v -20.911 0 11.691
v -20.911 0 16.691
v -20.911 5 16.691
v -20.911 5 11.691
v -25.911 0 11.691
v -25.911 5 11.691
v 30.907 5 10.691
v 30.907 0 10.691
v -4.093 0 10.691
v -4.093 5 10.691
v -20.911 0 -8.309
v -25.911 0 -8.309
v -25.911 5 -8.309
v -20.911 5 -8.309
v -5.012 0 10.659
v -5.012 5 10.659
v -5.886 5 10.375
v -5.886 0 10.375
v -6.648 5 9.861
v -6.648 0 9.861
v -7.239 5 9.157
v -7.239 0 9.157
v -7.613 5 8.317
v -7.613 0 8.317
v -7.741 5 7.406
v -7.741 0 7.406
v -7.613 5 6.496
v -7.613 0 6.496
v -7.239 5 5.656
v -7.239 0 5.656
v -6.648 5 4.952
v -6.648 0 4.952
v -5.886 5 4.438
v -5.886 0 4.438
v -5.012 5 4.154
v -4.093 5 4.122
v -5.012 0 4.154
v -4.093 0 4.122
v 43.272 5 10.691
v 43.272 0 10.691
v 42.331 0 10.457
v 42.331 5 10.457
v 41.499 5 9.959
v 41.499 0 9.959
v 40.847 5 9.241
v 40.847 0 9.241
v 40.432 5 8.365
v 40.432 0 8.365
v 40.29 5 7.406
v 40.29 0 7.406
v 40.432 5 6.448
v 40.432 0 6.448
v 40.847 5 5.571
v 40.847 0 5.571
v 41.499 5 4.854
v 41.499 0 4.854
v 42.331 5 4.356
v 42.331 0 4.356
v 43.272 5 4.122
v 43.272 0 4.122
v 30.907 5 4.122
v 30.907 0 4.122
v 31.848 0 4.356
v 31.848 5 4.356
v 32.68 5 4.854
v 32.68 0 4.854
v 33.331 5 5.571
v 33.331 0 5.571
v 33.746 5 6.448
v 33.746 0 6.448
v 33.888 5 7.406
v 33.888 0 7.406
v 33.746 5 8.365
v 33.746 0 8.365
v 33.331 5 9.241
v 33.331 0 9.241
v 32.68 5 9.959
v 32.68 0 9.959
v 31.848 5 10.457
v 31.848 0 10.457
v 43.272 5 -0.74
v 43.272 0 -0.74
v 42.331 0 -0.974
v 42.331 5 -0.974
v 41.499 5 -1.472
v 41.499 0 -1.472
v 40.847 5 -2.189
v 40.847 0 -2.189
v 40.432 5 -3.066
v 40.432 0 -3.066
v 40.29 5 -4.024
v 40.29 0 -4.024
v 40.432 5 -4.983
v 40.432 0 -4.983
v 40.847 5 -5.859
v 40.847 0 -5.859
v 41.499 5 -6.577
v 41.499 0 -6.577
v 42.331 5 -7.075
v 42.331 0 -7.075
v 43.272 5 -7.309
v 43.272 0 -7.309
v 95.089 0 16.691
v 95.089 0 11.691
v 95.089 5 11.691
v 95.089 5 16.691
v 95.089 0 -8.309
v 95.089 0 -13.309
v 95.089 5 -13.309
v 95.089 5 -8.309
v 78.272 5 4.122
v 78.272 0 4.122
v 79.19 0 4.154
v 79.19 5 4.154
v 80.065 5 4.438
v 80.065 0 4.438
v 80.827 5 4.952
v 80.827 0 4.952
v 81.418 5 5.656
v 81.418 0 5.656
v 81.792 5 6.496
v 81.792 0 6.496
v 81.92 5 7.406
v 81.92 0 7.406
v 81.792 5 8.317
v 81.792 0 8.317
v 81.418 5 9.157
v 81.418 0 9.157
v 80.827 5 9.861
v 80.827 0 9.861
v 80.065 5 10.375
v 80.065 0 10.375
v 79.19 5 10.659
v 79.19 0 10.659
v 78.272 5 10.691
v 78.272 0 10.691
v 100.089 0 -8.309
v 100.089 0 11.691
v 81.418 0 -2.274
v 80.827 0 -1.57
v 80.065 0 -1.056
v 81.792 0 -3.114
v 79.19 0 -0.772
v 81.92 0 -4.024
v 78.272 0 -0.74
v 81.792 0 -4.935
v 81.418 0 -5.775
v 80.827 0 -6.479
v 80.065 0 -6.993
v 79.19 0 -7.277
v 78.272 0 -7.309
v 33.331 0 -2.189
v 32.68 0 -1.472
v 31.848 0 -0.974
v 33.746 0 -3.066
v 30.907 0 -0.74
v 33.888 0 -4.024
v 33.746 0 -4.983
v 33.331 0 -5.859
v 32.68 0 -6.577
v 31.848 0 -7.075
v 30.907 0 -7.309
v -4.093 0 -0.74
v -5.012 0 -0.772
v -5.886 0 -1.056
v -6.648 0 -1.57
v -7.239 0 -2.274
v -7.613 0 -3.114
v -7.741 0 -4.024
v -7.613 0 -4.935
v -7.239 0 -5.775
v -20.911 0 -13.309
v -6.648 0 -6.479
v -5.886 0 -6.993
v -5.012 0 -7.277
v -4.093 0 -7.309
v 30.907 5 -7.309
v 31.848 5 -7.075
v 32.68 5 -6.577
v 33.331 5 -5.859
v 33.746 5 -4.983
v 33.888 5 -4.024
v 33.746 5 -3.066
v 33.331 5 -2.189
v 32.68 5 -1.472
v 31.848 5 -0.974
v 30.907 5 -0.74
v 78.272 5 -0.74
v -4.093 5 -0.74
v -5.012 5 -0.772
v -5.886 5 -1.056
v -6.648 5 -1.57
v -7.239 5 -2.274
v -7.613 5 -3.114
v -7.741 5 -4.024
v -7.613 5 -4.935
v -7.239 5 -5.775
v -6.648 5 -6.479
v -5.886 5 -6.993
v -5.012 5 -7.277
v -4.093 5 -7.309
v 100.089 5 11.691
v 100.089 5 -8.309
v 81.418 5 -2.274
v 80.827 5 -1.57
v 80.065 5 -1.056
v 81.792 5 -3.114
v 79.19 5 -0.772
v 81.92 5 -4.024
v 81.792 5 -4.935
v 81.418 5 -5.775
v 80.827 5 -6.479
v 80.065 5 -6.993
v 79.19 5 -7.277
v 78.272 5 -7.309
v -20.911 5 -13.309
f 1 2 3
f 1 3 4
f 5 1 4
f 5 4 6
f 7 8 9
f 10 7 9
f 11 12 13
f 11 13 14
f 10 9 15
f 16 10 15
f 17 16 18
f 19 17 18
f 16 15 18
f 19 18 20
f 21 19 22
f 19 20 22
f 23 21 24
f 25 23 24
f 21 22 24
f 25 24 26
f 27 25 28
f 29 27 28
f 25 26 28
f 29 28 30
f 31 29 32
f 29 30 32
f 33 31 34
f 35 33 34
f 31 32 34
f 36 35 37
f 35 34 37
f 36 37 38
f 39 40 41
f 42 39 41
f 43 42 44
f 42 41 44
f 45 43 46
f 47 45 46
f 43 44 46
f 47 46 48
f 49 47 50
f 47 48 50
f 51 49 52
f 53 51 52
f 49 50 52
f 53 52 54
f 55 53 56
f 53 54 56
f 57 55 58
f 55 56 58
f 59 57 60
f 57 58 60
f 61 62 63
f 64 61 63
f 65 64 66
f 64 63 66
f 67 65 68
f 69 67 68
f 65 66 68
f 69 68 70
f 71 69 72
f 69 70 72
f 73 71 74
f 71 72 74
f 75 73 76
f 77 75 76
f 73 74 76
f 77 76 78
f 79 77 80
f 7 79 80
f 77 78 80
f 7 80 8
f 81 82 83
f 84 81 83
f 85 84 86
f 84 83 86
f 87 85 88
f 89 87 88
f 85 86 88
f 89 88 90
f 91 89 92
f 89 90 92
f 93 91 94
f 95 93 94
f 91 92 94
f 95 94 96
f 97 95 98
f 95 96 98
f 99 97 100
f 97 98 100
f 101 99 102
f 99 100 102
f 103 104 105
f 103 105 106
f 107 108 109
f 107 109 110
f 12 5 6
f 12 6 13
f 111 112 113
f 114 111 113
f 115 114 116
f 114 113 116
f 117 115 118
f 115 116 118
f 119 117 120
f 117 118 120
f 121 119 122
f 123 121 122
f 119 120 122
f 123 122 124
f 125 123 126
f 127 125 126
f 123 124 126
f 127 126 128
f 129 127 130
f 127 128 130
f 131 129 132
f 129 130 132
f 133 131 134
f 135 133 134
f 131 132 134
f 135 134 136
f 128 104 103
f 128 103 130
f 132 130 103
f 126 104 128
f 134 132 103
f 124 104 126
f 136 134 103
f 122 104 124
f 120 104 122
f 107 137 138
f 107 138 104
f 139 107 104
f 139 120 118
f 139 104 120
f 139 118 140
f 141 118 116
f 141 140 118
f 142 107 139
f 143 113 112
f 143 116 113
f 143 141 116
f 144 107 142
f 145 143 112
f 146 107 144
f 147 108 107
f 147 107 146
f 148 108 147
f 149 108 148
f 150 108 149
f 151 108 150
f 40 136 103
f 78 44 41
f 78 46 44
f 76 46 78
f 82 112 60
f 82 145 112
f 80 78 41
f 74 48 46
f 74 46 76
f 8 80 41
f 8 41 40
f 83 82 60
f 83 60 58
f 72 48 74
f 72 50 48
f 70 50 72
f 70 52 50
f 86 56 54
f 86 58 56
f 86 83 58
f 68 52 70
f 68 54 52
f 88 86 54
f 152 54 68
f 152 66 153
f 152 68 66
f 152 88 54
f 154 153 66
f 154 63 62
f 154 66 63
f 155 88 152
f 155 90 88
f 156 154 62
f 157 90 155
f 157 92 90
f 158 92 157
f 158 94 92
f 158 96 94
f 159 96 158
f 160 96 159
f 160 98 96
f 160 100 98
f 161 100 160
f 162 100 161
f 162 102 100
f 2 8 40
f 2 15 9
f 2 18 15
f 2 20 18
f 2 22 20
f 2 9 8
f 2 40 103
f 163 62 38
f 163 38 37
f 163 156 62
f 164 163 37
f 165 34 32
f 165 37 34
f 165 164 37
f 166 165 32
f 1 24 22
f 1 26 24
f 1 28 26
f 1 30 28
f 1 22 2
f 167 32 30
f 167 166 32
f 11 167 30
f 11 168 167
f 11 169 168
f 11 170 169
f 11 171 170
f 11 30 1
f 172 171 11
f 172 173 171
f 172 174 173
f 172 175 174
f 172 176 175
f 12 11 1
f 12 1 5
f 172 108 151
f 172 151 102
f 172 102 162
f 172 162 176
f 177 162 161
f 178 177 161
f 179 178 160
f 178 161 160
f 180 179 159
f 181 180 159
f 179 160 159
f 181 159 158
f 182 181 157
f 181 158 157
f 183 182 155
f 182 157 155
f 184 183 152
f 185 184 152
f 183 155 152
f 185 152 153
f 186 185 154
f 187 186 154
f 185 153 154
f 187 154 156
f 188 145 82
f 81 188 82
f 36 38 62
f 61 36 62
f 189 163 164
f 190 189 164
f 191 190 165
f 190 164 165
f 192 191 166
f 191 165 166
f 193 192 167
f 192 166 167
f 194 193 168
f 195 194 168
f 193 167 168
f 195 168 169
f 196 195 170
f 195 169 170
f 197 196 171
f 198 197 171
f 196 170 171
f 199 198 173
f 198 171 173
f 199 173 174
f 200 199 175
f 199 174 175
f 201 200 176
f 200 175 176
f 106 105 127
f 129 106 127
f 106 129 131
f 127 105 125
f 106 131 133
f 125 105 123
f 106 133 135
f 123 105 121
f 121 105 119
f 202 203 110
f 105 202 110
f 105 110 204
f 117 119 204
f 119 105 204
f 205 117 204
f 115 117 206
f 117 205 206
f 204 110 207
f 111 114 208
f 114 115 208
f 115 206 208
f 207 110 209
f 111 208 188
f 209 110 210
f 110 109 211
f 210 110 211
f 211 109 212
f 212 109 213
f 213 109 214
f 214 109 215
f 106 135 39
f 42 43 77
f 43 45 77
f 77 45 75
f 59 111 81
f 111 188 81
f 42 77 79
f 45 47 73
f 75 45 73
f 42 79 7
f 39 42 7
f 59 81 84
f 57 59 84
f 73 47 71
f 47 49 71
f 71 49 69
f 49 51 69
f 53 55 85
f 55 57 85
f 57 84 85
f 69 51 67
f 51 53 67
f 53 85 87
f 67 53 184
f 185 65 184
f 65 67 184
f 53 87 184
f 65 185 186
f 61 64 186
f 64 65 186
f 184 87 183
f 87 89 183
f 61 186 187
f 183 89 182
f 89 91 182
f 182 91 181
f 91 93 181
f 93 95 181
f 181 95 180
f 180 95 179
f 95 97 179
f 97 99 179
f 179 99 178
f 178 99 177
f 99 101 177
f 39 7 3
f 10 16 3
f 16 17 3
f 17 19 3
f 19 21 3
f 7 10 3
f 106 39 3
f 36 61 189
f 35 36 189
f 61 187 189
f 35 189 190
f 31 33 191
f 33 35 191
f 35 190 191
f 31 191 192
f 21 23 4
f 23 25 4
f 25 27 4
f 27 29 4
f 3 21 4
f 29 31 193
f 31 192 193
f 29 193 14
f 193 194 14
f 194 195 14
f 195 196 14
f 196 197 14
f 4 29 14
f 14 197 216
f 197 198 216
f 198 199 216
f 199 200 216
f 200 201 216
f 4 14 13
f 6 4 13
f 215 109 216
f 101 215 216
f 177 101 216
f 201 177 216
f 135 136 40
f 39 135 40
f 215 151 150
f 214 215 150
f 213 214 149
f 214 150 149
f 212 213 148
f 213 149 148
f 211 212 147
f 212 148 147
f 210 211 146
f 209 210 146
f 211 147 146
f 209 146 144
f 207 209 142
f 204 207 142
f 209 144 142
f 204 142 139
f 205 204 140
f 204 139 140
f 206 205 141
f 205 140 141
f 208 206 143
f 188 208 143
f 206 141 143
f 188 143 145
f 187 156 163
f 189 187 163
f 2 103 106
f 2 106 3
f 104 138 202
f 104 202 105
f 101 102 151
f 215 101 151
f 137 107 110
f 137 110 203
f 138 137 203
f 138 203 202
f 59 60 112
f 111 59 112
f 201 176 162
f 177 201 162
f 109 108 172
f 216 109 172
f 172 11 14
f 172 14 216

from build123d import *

# Parameters (mm, degrees)
BOSS_EXTRUDE1_DEPTH = 5


with BuildPart() as part:
    # Sketch2 → Boss-Extrude1 (new body)
    with BuildSketch(Plane(origin=(0, 0, 0), x_dir=(1, 0, 0), z_dir=(0, 1, 0))):
        Polygon((46.589298205, 13.308977097), (51.589298205, 13.308977097), (95.089298205, 13.308977097), (95.089298205, 8.308977097), (100.089298205, 8.308977097), (100.089298205, -11.691022903), (95.089298205, -11.691022903), (95.089298205, -16.691022903), (-20.910701795, -16.691022903), (-20.910701795, -11.691022903), (-25.910701795, -11.691022903), (-25.910701795, 8.308977097), (-20.910701795, 8.308977097), (-20.910701795, 13.308977097), (22.589298205, 13.308977097), (27.589298205, 13.308977097), align=None)
        with BuildLine():
            Line((78.271526231, -10.691022903), (43.271526231, -10.691022903))
            ThreePointArc((43.271526231, -10.691022903), (40.290117596, -7.406437763), (43.271526231, -4.121852623))
            Line((43.271526231, -4.121852623), (78.271526231, -4.121852623))
            ThreePointArc((78.271526231, -4.121852623), (81.920004192, -7.406437763), (78.271526231, -10.691022903))
        make_face(mode=Mode.SUBTRACT)
        with BuildLine():
            Line((-4.092929821, -4.121852623), (30.907070179, -4.121852623))
            ThreePointArc((30.907070179, -4.121852623), (33.888478814, -7.406437763), (30.907070179, -10.691022903))
            Line((30.907070179, -10.691022903), (-4.092929821, -10.691022903))
            ThreePointArc((-4.092929821, -10.691022903), (-7.741407782, -7.406437763), (-4.092929821, -4.121852623))
        make_face(mode=Mode.SUBTRACT)
        with BuildLine():
            Line((-4.092929821, 7.308977097), (30.907070179, 7.308977097))
            ThreePointArc((30.907070179, 7.308977097), (33.888478814, 4.024391957), (30.907070179, 0.739806817))
            Line((30.907070179, 0.739806817), (-4.092929821, 0.739806817))
            ThreePointArc((-4.092929821, 0.739806817), (-7.741407782, 4.024391957), (-4.092929821, 7.308977097))
        make_face(mode=Mode.SUBTRACT)
        with BuildLine():
            Line((78.271526231, 0.739806817), (43.271526231, 0.739806817))
            ThreePointArc((43.271526231, 0.739806817), (40.290117596, 4.024391957), (43.271526231, 7.308977097))
            Line((43.271526231, 7.308977097), (78.271526231, 7.308977097))
            ThreePointArc((78.271526231, 7.308977097), (81.920004192, 4.024391957), (78.271526231, 0.739806817))
        make_face(mode=Mode.SUBTRACT)
    extrude(amount=BOSS_EXTRUDE1_DEPTH)


solid = part.part
